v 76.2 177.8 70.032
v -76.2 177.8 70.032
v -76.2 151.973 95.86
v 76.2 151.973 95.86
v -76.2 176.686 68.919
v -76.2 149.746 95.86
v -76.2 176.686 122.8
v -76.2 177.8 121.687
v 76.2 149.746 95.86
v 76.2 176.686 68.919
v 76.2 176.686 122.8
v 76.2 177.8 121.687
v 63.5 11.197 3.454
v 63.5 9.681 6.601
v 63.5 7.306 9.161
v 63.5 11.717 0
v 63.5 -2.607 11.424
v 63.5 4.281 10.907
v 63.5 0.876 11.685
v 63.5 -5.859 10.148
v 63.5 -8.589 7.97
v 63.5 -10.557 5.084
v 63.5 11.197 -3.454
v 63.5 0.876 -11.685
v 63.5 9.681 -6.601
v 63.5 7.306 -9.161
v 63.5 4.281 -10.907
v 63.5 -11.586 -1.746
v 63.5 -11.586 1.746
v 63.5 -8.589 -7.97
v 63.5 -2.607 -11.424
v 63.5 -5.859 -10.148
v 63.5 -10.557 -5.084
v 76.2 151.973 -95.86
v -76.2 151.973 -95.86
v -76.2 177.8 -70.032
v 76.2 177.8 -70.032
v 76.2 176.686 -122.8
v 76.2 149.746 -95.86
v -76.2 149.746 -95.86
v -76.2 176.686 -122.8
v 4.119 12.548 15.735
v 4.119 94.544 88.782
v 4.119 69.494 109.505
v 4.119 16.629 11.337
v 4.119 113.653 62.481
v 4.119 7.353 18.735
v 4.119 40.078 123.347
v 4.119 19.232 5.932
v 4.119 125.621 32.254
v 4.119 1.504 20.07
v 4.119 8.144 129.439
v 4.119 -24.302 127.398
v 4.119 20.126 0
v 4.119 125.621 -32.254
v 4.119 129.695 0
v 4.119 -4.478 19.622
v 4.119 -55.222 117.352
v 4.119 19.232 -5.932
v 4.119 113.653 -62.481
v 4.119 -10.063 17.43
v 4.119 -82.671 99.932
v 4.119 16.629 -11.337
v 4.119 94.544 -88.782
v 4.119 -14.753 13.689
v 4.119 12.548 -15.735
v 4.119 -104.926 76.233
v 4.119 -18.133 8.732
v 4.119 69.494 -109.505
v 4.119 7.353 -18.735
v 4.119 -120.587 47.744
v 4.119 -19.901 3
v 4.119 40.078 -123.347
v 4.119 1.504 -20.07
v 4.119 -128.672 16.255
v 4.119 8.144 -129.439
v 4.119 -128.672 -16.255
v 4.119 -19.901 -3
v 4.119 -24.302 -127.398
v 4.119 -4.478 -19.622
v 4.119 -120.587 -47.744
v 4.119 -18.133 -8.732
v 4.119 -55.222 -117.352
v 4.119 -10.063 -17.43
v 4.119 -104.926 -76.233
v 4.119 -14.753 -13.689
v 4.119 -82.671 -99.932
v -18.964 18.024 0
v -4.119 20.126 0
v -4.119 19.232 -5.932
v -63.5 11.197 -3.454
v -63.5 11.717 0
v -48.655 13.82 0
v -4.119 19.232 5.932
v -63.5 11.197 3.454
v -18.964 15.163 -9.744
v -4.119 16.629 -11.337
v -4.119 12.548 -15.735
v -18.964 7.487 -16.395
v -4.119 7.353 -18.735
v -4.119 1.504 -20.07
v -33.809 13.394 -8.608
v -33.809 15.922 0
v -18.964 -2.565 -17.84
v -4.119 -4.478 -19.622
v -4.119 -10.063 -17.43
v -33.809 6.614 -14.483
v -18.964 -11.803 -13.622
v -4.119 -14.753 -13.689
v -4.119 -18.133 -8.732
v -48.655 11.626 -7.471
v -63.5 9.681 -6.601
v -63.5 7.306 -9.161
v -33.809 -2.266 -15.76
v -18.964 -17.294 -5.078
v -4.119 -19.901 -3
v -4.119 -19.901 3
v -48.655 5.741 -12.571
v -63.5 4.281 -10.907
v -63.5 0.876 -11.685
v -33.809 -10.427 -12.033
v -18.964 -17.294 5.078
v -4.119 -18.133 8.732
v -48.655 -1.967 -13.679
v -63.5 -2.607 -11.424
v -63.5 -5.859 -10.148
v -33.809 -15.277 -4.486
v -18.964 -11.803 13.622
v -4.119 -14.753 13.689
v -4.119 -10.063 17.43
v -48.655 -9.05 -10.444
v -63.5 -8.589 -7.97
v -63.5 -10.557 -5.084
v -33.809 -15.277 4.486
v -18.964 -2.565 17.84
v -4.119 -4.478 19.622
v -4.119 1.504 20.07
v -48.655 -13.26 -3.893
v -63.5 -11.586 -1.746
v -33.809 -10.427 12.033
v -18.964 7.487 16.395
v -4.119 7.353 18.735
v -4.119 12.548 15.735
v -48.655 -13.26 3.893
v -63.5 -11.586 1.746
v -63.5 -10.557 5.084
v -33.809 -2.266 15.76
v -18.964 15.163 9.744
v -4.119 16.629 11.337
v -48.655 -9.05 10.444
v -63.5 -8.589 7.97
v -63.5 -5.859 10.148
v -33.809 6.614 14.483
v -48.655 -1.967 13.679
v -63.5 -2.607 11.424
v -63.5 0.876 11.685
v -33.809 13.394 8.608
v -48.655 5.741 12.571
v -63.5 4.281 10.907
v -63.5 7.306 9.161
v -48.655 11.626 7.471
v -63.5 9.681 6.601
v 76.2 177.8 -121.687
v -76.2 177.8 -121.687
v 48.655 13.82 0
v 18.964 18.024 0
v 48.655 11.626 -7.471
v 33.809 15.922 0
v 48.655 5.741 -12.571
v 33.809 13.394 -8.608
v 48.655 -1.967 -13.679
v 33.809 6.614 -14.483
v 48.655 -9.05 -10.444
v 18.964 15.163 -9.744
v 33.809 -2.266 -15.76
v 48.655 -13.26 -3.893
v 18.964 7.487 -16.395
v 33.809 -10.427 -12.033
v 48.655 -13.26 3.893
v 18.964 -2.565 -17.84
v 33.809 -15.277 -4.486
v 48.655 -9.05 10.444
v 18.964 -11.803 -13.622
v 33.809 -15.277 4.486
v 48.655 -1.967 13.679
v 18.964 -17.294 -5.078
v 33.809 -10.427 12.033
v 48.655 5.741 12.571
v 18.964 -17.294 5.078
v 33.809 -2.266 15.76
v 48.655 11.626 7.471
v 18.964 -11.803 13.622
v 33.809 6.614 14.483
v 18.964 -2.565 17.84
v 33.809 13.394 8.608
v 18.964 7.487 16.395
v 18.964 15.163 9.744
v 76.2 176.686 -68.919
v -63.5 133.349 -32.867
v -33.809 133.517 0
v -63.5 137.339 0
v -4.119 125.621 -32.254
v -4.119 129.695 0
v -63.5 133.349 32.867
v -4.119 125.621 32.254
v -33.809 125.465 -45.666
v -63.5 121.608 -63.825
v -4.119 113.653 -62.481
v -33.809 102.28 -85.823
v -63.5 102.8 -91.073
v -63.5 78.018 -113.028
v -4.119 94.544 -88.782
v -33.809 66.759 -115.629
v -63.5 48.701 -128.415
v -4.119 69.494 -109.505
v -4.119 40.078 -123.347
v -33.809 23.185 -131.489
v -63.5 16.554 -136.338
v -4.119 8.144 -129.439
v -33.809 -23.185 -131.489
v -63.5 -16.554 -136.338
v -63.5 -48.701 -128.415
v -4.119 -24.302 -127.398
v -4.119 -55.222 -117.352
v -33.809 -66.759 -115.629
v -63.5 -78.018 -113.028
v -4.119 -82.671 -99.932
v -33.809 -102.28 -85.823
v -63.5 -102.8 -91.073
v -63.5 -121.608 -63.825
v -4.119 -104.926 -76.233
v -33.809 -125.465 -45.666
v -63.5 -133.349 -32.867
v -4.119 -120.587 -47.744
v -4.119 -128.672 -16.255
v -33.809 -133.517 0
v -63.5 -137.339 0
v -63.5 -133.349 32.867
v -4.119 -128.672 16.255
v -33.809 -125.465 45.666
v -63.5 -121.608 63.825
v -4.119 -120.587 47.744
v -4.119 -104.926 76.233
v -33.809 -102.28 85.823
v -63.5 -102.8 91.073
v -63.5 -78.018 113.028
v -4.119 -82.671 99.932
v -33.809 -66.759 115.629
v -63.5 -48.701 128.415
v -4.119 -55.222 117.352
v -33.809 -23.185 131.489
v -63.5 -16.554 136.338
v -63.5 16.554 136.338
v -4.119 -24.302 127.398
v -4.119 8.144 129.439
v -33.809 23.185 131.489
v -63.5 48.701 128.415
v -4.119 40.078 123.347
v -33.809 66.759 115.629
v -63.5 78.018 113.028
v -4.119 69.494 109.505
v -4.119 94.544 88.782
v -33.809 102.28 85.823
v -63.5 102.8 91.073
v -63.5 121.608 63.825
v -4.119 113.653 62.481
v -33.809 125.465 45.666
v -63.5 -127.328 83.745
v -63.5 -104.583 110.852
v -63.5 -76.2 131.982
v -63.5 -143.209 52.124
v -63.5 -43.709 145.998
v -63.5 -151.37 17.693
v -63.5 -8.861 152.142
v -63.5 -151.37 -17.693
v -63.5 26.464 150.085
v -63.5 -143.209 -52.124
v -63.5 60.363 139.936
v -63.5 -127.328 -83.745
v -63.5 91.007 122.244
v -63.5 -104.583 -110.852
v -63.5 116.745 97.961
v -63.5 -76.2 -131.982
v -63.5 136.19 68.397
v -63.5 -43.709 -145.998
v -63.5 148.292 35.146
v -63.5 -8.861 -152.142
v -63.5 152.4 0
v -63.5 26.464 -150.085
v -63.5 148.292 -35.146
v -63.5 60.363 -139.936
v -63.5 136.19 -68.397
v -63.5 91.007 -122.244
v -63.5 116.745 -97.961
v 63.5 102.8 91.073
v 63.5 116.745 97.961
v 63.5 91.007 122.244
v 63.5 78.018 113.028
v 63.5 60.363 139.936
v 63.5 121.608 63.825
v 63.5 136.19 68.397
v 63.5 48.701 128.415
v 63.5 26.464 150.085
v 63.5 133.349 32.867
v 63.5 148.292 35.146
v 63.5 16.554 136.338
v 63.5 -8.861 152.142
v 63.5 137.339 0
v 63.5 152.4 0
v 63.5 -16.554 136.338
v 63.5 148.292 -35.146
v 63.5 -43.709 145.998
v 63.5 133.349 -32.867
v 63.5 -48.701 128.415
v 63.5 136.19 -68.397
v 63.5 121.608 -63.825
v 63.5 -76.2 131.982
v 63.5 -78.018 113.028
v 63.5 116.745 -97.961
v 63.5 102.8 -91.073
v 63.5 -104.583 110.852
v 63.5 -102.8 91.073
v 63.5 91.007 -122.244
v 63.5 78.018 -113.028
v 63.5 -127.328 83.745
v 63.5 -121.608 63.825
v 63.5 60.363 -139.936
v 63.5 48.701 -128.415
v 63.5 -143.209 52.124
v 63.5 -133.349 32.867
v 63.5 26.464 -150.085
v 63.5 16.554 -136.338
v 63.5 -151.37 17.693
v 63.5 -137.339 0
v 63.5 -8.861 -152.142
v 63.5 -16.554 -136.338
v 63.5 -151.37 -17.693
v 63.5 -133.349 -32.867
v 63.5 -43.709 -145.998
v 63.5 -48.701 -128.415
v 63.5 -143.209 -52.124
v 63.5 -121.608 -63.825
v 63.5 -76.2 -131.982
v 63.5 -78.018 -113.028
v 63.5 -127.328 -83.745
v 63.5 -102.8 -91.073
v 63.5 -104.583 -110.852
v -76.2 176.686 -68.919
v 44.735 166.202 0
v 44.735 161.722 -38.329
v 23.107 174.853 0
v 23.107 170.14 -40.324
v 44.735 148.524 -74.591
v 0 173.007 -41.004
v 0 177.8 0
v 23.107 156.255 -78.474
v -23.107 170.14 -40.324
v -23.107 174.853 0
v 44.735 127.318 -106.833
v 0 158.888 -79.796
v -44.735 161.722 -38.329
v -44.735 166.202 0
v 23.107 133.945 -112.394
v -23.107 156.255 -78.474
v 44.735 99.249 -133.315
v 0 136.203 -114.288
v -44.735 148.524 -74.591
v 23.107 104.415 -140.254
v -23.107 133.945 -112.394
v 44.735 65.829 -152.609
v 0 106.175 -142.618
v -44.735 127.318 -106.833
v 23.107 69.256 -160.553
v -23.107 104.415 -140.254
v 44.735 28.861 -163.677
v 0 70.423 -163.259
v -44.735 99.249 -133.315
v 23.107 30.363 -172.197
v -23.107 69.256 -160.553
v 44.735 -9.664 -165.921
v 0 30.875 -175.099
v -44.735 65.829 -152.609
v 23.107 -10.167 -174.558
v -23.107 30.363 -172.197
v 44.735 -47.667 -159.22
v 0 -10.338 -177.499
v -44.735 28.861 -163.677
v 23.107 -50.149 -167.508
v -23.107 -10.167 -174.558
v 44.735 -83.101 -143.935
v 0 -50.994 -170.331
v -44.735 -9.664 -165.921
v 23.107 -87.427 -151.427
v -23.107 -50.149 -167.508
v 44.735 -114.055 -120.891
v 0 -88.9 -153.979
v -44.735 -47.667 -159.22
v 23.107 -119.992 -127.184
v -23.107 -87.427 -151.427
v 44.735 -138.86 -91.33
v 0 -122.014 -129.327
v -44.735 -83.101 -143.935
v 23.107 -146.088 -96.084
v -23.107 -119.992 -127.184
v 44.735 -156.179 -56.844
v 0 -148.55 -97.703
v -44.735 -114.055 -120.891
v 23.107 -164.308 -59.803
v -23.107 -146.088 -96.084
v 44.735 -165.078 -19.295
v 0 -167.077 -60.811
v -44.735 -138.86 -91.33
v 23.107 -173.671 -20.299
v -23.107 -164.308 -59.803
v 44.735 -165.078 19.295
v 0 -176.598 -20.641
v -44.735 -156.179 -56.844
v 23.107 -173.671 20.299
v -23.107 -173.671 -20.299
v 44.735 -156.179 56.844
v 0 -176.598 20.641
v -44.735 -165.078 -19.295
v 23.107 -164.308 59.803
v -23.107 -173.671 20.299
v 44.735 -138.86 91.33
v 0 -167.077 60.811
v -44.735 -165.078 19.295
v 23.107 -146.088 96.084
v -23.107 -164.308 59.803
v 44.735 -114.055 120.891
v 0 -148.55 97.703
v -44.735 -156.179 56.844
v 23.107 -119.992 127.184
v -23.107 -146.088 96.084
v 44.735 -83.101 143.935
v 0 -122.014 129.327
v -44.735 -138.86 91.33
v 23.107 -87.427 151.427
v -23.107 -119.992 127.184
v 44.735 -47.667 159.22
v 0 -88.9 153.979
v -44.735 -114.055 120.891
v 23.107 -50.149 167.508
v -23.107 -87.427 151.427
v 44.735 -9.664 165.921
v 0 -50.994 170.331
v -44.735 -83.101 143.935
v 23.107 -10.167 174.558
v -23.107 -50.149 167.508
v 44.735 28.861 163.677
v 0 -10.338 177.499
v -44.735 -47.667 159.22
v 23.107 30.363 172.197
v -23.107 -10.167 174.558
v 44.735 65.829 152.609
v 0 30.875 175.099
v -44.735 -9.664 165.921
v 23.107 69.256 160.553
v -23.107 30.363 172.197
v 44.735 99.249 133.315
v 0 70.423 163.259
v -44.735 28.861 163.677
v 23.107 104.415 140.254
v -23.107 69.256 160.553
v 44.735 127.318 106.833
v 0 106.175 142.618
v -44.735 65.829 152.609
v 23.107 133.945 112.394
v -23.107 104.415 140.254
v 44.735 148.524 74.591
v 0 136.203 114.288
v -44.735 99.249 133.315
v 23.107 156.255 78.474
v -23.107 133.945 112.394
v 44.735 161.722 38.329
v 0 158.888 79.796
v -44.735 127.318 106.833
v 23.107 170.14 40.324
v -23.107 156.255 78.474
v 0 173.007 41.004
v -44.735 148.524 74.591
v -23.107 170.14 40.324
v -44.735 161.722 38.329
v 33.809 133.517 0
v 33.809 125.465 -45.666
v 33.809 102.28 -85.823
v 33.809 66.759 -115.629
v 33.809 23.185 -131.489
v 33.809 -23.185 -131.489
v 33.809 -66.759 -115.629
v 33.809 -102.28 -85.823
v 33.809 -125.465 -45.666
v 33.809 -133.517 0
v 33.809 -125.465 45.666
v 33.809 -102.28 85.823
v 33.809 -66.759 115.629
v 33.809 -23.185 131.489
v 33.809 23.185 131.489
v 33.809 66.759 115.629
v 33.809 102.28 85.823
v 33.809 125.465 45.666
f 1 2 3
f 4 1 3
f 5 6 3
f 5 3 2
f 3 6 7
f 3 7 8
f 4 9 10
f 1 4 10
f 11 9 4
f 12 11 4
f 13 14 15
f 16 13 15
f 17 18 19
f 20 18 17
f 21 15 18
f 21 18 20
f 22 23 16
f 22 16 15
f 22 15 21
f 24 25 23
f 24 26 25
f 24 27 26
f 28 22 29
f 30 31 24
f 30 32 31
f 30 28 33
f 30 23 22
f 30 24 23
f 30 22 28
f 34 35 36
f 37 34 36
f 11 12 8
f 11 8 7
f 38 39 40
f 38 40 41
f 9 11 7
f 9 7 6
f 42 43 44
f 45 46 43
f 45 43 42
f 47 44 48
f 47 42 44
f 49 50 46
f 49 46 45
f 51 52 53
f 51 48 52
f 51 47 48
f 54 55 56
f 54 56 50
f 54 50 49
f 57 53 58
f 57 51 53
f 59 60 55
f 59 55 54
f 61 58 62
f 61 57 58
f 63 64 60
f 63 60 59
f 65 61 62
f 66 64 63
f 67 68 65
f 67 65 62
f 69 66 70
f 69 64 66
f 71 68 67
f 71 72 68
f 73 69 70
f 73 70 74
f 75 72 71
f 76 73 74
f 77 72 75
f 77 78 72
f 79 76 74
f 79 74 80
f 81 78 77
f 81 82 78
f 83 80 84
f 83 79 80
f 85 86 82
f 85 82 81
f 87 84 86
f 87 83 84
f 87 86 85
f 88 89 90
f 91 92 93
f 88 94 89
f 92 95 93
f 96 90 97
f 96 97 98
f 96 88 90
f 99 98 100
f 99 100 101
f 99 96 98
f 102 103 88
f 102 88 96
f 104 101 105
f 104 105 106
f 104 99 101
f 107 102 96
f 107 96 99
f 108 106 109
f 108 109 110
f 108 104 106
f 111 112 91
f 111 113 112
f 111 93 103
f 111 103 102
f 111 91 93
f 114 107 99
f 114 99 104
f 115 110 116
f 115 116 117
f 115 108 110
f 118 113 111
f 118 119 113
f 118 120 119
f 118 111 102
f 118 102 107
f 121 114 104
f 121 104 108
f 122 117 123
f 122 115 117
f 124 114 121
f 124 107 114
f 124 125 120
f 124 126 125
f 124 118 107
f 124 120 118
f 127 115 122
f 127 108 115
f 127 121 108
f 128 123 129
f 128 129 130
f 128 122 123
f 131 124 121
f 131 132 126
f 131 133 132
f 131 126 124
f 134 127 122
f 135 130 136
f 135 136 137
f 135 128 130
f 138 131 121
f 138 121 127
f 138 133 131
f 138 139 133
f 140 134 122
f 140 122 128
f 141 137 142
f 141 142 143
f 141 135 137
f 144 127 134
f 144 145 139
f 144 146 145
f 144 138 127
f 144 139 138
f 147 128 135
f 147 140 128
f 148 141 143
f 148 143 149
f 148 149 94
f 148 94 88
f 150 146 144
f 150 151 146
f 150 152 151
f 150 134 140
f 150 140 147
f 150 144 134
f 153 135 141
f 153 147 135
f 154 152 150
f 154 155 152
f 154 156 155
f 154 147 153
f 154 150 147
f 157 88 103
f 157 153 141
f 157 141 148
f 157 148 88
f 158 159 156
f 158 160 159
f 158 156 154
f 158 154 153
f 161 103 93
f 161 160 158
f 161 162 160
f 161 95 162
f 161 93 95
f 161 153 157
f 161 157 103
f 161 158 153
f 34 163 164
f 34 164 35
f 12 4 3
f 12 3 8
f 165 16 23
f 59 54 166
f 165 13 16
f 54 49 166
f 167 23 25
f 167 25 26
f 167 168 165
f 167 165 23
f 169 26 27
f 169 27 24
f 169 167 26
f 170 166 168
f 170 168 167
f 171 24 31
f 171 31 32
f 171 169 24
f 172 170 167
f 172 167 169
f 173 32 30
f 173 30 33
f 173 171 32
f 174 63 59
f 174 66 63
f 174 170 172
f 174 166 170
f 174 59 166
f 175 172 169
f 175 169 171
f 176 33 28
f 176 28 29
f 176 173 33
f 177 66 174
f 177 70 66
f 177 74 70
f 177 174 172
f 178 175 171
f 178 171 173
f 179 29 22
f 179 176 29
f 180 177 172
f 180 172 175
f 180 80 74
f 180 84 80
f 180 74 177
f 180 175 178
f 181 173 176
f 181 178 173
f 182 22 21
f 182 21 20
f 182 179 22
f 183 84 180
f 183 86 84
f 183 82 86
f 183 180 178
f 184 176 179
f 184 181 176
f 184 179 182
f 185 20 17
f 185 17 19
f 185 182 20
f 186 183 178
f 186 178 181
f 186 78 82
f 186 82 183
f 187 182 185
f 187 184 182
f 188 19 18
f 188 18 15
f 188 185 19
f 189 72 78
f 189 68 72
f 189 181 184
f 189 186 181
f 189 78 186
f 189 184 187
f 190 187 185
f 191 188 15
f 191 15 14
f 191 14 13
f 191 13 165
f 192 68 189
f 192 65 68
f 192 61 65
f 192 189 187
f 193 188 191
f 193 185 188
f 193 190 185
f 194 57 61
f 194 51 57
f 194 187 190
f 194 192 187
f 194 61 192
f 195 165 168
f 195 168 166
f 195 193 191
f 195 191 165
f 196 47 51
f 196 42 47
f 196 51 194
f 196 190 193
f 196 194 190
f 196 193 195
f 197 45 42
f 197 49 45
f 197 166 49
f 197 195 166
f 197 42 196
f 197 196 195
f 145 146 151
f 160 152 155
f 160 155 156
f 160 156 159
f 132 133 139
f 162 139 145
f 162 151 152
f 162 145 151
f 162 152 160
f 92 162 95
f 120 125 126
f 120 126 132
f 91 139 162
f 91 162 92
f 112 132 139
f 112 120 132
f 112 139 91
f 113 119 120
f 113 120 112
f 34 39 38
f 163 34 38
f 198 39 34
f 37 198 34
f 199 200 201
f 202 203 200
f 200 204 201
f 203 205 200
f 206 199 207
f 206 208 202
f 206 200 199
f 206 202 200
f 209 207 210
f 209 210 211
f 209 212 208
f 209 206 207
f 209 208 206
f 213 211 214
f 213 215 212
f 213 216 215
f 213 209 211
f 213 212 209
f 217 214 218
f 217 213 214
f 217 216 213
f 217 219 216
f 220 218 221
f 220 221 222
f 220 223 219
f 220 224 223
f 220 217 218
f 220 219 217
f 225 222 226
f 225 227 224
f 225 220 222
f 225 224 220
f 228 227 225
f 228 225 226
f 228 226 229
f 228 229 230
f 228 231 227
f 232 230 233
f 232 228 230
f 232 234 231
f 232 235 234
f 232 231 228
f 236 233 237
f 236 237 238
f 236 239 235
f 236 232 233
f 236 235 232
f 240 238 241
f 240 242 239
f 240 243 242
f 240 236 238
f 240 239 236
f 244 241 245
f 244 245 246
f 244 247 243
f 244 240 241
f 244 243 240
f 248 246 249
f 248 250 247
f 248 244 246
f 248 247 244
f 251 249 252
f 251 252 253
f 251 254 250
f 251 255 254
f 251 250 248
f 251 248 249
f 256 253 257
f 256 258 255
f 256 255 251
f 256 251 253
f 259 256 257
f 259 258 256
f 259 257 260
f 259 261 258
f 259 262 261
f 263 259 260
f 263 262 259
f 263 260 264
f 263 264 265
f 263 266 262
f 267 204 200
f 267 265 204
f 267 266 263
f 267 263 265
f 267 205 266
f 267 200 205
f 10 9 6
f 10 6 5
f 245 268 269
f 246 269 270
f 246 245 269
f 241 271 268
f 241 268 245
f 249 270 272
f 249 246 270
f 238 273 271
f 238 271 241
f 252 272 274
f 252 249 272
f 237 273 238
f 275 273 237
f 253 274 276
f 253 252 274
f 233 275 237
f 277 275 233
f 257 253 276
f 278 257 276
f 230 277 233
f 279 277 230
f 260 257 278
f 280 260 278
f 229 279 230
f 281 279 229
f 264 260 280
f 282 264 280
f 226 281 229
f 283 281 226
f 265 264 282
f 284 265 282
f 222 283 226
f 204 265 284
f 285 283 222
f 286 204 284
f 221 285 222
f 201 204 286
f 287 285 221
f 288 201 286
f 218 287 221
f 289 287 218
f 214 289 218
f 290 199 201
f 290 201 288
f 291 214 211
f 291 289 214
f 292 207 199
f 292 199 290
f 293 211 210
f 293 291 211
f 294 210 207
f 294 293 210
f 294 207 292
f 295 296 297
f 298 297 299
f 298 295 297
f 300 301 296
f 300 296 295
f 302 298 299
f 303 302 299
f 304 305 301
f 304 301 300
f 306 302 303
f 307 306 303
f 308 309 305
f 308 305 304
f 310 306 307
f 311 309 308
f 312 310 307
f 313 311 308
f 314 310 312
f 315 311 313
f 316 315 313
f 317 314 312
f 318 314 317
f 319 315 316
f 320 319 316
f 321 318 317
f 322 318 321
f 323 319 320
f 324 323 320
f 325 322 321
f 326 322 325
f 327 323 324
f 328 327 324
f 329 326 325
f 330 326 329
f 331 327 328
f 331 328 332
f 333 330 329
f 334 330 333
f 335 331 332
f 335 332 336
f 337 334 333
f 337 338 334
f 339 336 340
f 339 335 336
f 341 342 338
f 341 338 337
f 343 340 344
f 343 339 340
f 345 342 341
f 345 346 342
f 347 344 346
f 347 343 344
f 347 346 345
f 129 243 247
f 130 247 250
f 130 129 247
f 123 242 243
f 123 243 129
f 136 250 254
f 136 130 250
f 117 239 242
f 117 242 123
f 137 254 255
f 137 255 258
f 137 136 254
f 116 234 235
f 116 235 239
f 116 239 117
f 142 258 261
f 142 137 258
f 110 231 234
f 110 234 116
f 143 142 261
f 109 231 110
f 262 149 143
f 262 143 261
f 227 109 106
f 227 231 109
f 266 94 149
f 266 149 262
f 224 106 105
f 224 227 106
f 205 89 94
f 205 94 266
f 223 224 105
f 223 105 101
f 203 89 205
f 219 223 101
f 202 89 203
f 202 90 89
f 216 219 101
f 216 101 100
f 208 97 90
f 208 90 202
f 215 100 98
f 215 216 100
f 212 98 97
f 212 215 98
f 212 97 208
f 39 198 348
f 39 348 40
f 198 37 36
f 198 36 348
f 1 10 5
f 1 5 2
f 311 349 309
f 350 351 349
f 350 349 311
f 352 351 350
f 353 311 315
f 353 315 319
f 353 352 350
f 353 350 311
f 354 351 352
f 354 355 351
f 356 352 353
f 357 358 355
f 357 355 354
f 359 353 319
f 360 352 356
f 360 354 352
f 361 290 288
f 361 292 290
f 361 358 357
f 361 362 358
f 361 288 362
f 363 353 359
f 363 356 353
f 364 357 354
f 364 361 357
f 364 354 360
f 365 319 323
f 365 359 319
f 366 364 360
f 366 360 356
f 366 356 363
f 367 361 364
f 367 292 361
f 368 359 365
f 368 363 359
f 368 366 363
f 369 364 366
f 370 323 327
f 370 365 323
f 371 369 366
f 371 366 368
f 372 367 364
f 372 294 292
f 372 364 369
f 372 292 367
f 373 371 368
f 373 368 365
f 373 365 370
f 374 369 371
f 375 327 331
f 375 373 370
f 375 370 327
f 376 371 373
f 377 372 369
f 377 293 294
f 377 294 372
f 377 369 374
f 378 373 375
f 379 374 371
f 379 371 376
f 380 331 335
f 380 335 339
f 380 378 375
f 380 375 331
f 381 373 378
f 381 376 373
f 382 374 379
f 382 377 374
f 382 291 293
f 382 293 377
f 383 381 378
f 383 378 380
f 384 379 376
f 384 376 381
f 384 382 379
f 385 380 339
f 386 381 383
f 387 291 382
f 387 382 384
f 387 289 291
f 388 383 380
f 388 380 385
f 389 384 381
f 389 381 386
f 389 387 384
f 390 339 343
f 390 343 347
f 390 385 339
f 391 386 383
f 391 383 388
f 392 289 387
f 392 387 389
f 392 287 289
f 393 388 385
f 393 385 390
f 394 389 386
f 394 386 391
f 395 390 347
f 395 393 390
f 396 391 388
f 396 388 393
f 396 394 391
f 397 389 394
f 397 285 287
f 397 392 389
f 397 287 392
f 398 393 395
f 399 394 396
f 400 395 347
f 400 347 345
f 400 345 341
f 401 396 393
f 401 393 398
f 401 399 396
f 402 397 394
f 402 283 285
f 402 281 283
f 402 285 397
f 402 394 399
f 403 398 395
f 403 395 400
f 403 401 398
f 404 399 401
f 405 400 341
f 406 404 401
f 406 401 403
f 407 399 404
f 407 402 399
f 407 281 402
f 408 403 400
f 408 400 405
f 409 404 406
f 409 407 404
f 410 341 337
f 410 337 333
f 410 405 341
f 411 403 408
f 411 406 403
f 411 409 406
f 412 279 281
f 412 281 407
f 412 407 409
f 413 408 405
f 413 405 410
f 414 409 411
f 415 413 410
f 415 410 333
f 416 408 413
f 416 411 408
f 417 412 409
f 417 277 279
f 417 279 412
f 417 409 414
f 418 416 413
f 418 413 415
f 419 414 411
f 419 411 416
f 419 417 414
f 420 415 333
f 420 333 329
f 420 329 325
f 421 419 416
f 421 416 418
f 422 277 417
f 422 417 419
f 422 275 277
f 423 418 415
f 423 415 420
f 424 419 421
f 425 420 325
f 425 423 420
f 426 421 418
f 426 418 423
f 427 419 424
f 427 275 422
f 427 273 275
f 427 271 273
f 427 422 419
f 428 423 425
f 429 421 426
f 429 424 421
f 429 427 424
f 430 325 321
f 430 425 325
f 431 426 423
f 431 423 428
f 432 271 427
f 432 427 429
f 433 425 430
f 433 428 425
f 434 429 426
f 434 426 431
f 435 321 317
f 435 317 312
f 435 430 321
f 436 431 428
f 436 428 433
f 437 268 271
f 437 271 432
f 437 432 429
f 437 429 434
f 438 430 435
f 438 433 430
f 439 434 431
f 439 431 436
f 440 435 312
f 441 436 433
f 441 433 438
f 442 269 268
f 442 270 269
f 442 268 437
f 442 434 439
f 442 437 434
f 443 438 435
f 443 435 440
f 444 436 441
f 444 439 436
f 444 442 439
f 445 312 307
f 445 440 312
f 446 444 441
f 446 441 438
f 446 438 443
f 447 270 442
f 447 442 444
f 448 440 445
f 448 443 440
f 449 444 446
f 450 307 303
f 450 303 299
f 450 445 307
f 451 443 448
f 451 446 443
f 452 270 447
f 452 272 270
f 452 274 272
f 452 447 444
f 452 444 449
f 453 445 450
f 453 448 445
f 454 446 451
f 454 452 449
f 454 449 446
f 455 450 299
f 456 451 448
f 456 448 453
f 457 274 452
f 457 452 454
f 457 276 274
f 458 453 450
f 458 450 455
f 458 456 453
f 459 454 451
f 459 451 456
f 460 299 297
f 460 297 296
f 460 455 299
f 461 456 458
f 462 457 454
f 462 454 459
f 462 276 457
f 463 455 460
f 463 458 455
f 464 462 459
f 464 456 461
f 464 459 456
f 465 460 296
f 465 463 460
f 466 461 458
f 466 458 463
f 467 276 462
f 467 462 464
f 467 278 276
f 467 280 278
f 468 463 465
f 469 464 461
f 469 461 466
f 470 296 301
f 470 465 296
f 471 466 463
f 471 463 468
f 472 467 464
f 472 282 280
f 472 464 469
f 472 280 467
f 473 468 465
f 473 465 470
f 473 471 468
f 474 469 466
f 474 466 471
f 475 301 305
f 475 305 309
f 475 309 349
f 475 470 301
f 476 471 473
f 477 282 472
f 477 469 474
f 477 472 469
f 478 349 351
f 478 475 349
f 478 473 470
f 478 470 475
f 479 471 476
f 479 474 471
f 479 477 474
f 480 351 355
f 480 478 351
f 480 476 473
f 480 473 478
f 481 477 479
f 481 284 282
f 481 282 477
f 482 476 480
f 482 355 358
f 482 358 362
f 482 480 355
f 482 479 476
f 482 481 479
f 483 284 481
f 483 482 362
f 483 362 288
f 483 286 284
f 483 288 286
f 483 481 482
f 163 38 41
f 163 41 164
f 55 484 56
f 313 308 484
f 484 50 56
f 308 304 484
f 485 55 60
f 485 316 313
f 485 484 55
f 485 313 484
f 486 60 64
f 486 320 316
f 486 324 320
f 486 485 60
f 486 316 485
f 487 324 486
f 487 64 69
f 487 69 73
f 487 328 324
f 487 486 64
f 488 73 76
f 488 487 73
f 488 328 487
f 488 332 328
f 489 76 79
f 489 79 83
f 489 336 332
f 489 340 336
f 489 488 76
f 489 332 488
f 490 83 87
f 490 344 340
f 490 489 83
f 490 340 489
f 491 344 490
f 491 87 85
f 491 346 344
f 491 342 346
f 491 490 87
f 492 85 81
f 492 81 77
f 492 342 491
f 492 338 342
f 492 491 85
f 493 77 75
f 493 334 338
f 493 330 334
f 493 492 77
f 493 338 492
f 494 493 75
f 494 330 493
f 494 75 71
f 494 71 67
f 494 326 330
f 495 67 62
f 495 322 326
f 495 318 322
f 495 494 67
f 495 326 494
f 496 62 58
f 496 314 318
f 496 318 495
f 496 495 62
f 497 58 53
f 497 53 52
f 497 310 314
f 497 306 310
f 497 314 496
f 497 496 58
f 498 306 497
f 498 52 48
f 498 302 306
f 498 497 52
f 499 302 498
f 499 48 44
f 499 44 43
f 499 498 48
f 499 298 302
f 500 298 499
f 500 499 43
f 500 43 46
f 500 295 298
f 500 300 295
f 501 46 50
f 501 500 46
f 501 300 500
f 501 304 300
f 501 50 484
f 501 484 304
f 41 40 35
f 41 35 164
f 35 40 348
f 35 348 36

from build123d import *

# Parameters (mm, degrees)
F4_DEPTH = 152.4


with BuildPart() as f1:
    # F0 (on Top) → F1 (revolve)
    with BuildSketch(Plane.XY):
        with BuildLine():
            Line((63.5, 137.339488), (63.5, 152.4))
            ThreePointArc((63.5, 152.4), (0, 177.8), (-63.5, 152.4))
            Line((-63.5, 152.4), (-63.5, 137.339488))
            Line((-63.5, 137.339488), (-4.118823, 129.695132))
            Line((-4.118823, 129.695132), (-4.118823, 20.126132))
            Line((-4.118823, 20.126132), (-63.5, 11.717348))
            Line((-63.5, 11.717348), (-63.5, 0))
            Line((-63.5, 0), (63.5, 0))
            Line((63.5, 0), (63.5, 11.717348))
            Line((63.5, 11.717348), (4.118823, 20.126132))
            Line((4.118823, 20.126132), (4.118823, 129.695132))
            Line((4.118823, 129.695132), (63.5, 137.339488))
        make_face()
    revolve(axis=Axis((-121.540091, 0, 0), (-1, 0, 0)))


with BuildPart() as f4:
    # F3 (on offset) → F4 (new body)
    with BuildSketch(Plane.YZ.offset(76.2)):
        Polygon((176.686448, -68.918876), (149.74568, -95.859644), (176.686448, -122.800412), (177.8, -121.686861), (151.972783, -95.859644), (177.8, -70.032427), align=None)
        Polygon((176.686448, 68.918876), (177.8, 70.032427), (151.972783, 95.859644), (177.8, 121.686861), (176.686448, 122.800412), (149.74568, 95.859644), align=None)
    extrude(amount=-F4_DEPTH)


solid = Compound([f1.part, f4.part])
